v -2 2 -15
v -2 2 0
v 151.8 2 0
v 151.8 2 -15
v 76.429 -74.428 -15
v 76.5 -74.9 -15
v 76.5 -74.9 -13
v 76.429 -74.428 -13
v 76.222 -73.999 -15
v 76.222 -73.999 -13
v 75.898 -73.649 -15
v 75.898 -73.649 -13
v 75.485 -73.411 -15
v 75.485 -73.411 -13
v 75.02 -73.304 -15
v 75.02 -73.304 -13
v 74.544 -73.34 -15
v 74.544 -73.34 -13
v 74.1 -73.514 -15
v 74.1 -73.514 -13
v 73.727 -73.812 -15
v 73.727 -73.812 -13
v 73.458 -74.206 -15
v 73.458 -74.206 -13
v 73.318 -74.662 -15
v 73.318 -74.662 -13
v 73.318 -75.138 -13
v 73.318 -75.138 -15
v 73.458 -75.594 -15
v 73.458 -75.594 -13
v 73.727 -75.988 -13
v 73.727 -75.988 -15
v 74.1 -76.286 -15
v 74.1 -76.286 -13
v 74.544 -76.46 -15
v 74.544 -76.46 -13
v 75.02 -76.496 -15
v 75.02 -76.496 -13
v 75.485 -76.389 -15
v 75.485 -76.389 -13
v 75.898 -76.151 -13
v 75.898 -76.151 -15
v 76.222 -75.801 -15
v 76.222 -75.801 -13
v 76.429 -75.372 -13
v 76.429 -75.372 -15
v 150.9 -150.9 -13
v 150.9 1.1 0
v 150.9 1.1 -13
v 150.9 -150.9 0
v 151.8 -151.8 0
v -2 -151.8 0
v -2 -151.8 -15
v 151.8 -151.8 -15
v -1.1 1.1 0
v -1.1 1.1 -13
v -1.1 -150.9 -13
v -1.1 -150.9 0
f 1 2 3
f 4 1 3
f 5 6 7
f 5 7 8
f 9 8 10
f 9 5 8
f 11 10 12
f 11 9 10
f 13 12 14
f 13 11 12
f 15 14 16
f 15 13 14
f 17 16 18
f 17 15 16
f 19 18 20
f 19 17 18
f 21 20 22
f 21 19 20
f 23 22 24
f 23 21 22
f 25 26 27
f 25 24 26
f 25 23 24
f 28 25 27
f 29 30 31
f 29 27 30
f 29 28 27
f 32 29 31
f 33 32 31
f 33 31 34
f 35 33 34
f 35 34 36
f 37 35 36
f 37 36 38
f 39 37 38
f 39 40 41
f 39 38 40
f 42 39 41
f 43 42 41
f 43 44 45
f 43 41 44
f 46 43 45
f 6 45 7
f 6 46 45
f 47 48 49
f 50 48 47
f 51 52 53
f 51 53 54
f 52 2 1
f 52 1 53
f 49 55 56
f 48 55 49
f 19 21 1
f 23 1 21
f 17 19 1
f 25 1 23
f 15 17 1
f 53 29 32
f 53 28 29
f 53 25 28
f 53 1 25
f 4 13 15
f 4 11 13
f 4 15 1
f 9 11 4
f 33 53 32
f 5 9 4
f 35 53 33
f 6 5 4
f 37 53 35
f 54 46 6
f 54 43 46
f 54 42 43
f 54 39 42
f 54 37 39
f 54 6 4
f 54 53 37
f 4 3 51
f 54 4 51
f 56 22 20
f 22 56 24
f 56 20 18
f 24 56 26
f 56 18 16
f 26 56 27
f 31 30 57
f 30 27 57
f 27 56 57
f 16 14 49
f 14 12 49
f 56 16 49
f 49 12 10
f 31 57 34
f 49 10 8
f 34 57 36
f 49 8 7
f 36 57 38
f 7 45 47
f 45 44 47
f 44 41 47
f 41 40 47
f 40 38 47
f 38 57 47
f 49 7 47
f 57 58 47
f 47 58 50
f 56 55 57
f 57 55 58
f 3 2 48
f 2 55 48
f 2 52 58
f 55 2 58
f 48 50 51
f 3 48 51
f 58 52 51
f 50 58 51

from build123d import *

# Parameters (mm, degrees)
BOX_W             = 153.8
BOX_H             = 153.8
BOX_DEPTH         = 15
BOX001_W          = 152
BOX001_H          = 152
BOX001_DEPTH      = 13
CYLINDER002_R     = 1.6
CYLINDER002_DEPTH = 10


with BuildPart() as part:
    # Box → Box (join)
    with BuildSketch(Plane(origin=(-2, 2, 0), x_dir=(1, 0, 0), z_dir=(0, 0, -1))):
        with Locations((76.9, 76.9)):
            Rectangle(BOX_W, BOX_H)
    extrude(amount=BOX_DEPTH)

    # Box001 → Box001 (cut)
    with BuildSketch(Plane(origin=(-1.1, 1.1, 0), x_dir=(1, 0, 0), z_dir=(0, 0, -1))):
        with Locations((76, 76)):
            Rectangle(BOX001_W, BOX001_H)
    extrude(amount=BOX001_DEPTH, mode=Mode.SUBTRACT)

    # Cylinder002 → Cylinder002 (cut)
    with BuildSketch(Plane(origin=(74.9, -74.9, -19.5), x_dir=(1, 0, 0), z_dir=(0, 0, 1))):
        Circle(CYLINDER002_R)
    extrude(amount=CYLINDER002_DEPTH, mode=Mode.SUBTRACT)


solid = part.part
